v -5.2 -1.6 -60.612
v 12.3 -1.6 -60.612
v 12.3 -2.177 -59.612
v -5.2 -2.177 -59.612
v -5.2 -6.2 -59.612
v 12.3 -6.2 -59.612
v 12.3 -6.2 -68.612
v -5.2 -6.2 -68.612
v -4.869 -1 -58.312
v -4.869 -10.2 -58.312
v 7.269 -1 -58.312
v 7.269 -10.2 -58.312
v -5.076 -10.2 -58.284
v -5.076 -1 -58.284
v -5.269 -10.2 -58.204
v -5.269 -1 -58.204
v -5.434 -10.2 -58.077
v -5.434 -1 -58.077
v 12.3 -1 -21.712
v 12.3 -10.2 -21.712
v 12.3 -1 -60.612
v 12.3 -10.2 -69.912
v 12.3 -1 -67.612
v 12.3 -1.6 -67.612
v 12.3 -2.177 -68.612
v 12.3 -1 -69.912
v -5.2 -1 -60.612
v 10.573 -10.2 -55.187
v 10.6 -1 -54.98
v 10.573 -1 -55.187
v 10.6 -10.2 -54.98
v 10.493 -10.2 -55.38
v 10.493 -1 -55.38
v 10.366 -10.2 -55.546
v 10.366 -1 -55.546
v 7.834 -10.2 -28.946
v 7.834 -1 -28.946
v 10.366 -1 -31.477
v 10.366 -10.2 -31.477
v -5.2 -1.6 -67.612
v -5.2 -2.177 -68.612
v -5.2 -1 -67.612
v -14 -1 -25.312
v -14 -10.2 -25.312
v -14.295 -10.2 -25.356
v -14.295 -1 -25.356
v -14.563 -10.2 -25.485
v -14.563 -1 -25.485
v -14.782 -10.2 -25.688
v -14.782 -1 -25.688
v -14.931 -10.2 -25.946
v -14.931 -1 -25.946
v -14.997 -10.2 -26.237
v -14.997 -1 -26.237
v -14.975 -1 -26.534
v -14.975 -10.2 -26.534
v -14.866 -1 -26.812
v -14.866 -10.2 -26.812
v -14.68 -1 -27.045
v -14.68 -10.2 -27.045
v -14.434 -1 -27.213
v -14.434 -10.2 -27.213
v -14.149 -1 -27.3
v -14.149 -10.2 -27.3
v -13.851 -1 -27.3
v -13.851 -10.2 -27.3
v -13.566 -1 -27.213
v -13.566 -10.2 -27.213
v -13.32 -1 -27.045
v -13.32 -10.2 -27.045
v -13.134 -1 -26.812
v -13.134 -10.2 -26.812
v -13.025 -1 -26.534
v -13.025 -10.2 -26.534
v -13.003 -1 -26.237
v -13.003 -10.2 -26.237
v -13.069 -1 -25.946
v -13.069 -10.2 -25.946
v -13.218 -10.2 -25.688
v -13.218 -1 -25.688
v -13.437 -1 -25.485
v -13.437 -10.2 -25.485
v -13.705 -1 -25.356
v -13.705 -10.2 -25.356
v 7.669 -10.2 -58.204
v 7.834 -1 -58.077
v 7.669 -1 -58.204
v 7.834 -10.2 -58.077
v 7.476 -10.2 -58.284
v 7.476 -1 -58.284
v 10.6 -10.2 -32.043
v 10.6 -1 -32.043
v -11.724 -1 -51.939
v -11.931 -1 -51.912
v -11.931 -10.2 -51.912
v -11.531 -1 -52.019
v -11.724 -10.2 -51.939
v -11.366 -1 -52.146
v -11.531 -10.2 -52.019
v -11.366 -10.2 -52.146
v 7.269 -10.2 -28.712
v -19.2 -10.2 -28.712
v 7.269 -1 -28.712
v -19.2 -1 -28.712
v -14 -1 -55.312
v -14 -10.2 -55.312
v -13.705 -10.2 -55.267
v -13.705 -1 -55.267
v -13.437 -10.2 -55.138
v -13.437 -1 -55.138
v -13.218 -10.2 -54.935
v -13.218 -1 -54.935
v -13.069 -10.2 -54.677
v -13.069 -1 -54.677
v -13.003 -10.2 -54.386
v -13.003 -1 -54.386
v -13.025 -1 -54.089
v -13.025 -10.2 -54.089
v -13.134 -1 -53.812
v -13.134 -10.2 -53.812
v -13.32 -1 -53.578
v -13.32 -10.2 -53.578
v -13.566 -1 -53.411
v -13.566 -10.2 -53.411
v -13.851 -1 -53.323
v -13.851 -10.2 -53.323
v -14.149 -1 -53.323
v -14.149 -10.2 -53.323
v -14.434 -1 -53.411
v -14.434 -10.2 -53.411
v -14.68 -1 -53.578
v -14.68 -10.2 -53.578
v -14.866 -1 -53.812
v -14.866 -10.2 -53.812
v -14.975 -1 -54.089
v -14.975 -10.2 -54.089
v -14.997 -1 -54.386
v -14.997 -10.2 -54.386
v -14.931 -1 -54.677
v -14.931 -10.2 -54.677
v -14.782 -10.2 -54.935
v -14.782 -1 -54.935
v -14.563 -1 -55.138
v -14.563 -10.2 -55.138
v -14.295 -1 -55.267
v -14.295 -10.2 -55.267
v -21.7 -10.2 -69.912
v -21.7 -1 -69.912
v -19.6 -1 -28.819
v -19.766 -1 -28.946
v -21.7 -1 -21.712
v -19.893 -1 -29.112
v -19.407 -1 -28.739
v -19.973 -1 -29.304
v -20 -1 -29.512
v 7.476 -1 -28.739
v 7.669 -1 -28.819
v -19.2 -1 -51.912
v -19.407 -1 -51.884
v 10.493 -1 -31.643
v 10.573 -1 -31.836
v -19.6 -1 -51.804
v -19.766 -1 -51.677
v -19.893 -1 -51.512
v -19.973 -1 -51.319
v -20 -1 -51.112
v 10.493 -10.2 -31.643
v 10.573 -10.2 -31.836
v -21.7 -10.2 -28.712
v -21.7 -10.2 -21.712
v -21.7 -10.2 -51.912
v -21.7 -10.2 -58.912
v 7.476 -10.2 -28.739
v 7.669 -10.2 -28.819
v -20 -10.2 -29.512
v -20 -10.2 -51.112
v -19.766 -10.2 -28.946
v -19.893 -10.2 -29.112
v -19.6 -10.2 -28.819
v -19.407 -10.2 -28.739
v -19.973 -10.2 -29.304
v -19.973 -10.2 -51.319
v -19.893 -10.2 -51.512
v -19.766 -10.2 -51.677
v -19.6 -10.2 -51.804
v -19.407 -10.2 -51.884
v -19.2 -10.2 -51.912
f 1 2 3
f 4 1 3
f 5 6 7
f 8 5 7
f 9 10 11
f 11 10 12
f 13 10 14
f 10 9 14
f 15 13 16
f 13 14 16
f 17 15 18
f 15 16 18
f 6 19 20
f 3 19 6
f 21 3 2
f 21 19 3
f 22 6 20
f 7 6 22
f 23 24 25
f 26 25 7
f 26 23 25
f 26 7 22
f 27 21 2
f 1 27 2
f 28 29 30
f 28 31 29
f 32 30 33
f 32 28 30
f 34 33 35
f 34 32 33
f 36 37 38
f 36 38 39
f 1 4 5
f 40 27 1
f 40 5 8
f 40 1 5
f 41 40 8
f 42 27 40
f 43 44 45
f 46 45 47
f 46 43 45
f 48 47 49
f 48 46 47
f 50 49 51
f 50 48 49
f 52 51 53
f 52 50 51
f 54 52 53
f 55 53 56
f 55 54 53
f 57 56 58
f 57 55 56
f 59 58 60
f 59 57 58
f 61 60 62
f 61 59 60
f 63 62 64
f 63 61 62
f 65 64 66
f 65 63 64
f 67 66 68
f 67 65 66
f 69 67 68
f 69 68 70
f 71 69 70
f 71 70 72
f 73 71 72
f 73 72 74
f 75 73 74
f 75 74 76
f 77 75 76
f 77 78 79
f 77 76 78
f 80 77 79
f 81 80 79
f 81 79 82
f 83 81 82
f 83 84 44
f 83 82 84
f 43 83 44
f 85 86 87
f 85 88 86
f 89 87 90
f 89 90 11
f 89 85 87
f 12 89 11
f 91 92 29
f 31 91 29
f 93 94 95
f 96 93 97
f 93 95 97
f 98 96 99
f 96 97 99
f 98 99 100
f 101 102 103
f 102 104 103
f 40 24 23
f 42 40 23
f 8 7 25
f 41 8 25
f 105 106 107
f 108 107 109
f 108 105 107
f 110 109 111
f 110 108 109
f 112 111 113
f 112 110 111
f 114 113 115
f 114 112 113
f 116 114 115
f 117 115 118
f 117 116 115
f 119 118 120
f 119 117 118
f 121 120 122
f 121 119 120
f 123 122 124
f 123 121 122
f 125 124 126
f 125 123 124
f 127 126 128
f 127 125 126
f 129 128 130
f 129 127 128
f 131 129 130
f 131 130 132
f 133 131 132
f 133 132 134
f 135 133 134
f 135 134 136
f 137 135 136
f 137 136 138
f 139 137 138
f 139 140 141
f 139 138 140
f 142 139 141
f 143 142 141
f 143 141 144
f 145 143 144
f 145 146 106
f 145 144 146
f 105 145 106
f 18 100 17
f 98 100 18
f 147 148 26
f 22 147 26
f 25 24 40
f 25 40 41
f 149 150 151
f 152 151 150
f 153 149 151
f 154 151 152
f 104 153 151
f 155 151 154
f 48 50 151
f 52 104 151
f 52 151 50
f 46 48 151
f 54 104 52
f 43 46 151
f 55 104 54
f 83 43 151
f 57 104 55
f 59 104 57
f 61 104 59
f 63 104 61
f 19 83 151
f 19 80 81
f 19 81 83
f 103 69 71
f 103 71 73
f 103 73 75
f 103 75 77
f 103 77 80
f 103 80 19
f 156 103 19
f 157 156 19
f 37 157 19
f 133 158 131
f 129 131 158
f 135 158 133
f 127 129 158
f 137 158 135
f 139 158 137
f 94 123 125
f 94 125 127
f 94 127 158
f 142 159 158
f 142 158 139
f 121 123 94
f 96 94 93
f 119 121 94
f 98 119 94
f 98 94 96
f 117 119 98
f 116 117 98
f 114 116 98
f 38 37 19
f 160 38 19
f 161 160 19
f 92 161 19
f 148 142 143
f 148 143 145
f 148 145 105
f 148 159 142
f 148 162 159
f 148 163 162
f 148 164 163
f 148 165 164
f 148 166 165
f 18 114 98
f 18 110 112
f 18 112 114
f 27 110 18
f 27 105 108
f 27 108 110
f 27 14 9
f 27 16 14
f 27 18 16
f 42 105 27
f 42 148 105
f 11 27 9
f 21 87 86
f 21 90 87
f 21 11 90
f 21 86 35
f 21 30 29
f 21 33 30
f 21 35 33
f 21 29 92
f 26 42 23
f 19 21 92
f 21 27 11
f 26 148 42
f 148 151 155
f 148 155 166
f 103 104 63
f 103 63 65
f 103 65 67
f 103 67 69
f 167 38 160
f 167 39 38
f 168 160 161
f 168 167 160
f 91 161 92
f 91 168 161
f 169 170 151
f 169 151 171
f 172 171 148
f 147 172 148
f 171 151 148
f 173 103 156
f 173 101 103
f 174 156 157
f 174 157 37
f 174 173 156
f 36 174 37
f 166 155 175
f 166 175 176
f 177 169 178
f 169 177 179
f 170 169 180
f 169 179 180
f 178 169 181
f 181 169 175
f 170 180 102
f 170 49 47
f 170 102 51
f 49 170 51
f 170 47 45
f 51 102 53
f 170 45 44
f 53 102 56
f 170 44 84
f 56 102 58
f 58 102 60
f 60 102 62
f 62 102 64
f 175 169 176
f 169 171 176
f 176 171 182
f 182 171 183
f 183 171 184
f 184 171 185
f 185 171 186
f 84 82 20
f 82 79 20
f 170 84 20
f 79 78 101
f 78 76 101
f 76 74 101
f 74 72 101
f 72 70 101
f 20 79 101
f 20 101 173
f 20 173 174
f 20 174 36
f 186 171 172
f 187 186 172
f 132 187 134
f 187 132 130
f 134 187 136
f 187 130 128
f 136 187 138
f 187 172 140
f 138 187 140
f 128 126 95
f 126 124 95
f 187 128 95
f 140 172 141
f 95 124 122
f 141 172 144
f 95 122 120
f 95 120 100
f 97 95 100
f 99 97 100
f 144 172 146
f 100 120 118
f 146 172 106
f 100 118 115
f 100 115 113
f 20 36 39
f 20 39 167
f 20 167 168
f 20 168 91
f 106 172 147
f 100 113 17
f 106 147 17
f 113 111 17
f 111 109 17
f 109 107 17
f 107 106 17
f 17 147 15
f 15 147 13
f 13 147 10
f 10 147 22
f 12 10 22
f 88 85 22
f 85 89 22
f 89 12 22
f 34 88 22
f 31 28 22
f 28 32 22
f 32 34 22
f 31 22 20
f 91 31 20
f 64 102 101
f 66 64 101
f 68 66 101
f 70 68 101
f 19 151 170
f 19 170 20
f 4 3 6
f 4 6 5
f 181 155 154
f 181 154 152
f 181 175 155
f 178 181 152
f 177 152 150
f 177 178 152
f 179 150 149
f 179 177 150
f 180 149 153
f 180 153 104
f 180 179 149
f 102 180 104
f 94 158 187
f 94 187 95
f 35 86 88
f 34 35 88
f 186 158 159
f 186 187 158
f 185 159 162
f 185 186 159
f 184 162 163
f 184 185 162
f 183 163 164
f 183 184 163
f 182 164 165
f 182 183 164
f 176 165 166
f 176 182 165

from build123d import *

# Parameters (mm, degrees)
BOSS_EXTRUDE1_START      = -1
SKETCH1_W                = 1.7
SKETCH1_H                = 89.2
BOSS_EXTRUDE1_DEPTH      = 9.2
SKETCH4_W                = 33.7
SKETCH4_H                = 11.6
BOSS_EXTRUDE3_DEPTH      = 9.2
SERVO_HOLDER_DEPTH       = 1
SERVO_HOLDER_DEPTH_BACK  = 9.2
SKETCH3_W                = 14
SKETCH3_H                = 7
SKETCH3_R                = 1
SKETCH37_W               = 20
SKETCH37_H               = 7
BOSS_EXTRUDE19_DEPTH     = 10.2
CUT_EXTRUDE10_DEPTH      = 93.482268571
CUT_EXTRUDE10_DEPTH_BACK = 93.482268571
SKETCH29_W               = 34.409909993
SKETCH29_H               = 5.977389624
BOSS_EXTRUDE13_START     = 2
SKETCH30_W               = 34
SKETCH30_H               = 38
SKETCH30_R               = 1.6
BOSS_EXTRUDE13_DEPTH     = 6.5
SKETCH41_W               = 17.288461538
SKETCH41_H               = 9.2
CUT_EXTRUDE14_DEPTH      = 15
BOSS_EXTRUDE14_START     = -38
SKETCH32_R               = 1.45
SKETCH32_R_2             = 5
BOSS_EXTRUDE14_DEPTH     = 8.8
BOSS_EXTRUDE16_DEPTH     = 3
BOSS_EXTRUDE17_DEPTH     = 3
BOSS_EXTRUDE18_START     = -9.2
BOSS_EXTRUDE18_DEPTH     = 9.2
SKETCH39_W               = 1.7
SKETCH39_H               = 41.2
BOSS_EXTRUDE20_DEPTH     = 9.2
CUT_EXTRUDE13_DEPTH      = 17.5
CHAMFER2_SIZE            = 0.6
CHAMFER2_SIZE_2          = 1.039230485
CHAMFER3_SIZE            = 3
FILLET10_R               = 6
CUT_EXTRUDE15_DEPTH      = 10
CHAMFER4_SIZE            = 2.5
CUT_EXTRUDE16_DEPTH      = 10
FILLET11_R               = 0.8
SKETCH44_W               = 59.192885725
SKETCH44_H               = 45.417181718
CUT_EXTRUDE17_DEPTH      = 87.948983376


with BuildPart() as part:
    # Sketch1 → Boss-Extrude1 (new body)
    with BuildSketch(Plane(origin=(0, 0, 0), x_dir=(1, 0, 0), z_dir=(0, 1, 0)).offset(BOSS_EXTRUDE1_START)):
        with Locations((-20.85, 25.311538462)):
            Rectangle(SKETCH1_W, SKETCH1_H)
    extrude(amount=-BOSS_EXTRUDE1_DEPTH)

    # Sketch4 → Boss-Extrude3 (add)
    with BuildSketch(Plane.XZ.offset(10.2)):
        with Locations((-4.85, -64.111538462)):
            Rectangle(SKETCH4_W, SKETCH4_H)
    extrude(amount=-BOSS_EXTRUDE3_DEPTH)

    # Sketch3 → Servo Holder (add, two sides: drawn at the far end of the back side and taken through both)
    # profile 1 of 2: a face of its own
    with BuildSketch(Plane.XZ.offset(10.2).offset(-SERVO_HOLDER_DEPTH_BACK)):
        with Locations((-14.7, -55.411538462)):
            Rectangle(SKETCH3_W, SKETCH3_H)
        with Locations(Location((-14, -54.311538462, 0), (0, 0, 270))):
            Circle(SKETCH3_R, mode=Mode.SUBTRACT)
    # profile 2 of 2: a face of its own
    with BuildSketch(Plane.XZ.offset(10.2).offset(-SERVO_HOLDER_DEPTH_BACK)):
        with Locations((-14.7, -25.211538462)):
            Rectangle(SKETCH3_W, SKETCH3_H)
        with Locations(Location((-14, -26.311538462, 0), (0, 0, 90))):
            Circle(SKETCH3_R, mode=Mode.SUBTRACT)
    extrude(amount=SERVO_HOLDER_DEPTH + SERVO_HOLDER_DEPTH_BACK)

    # Sketch37 → Boss-Extrude19 (add)
    with BuildSketch(Plane(origin=(0, -1, 0), x_dir=(1, 0, 0), z_dir=(0, 1, 0))):
        with Locations((2.3, 25.211538462)):
            Rectangle(SKETCH37_W, SKETCH37_H)
    extrude(amount=-BOSS_EXTRUDE19_DEPTH)

    # Sketch29 → Cut-Extrude10 (cut, two sides: drawn at the far end of the back side and taken through both)
    with BuildSketch(Plane(origin=(0, 0, -69.911538462), x_dir=(-1, 0, 0), z_dir=(0, 0, -1)).offset(-CUT_EXTRUDE10_DEPTH_BACK)):
        with Locations((4.495045004, -13.188694812)):
            Rectangle(SKETCH29_W, SKETCH29_H)
    extrude(amount=CUT_EXTRUDE10_DEPTH + CUT_EXTRUDE10_DEPTH_BACK, mode=Mode.SUBTRACT)


with BuildPart() as body_2:
    # Sketch30 → Boss-Extrude13 (new body)
    with BuildSketch(Plane.XY.offset(BOSS_EXTRUDE13_START)):
        with Locations((-4.7, -20)):
            Rectangle(SKETCH30_W, SKETCH30_H)
        with Locations(Location((5.3, -34, 0), (0, 0, 180))):
            Circle(SKETCH30_R, mode=Mode.SUBTRACT)
        with Locations(Location((5.3, -19, 0), (0, 0, 180))):
            Circle(SKETCH30_R, mode=Mode.SUBTRACT)
        with Locations(Location((-14.7, -34, 0), (0, 0, 180))):
            Circle(SKETCH30_R, mode=Mode.SUBTRACT)
        with Locations(Location((-14.7, -19, 0), (0, 0, 180))):
            Circle(SKETCH30_R, mode=Mode.SUBTRACT)
    extrude(amount=BOSS_EXTRUDE13_DEPTH)


with BuildPart() as cut_extrude14_tool:
    # Sketch41 → Cut-Extrude14 (new body)
    with BuildSketch(Plane(origin=(-20, 0, 0), x_dir=(0, 0, -1), z_dir=(1, 0, 0))):
        with Locations((-10.644230769, -5.6)):
            Rectangle(SKETCH41_W, SKETCH41_H)
    extrude(amount=-CUT_EXTRUDE14_DEPTH)


with BuildPart() as part_1:
    add(part.part)

    # Cut-Extrude14: cut by cut_extrude14_tool
    add(cut_extrude14_tool.part, mode=Mode.SUBTRACT)



with BuildPart() as body_2_1:
    add(body_2.part)

    # Cut-Extrude14: cut by cut_extrude14_tool
    add(cut_extrude14_tool.part, mode=Mode.SUBTRACT)

    # Sketch32 → Boss-Extrude14 (add)
    with BuildSketch(Plane.XZ.offset(39).offset(BOSS_EXTRUDE14_START)):
        with BuildLine():
            ThreePointArc((11.872921748, 2), (25.925390485, -3.535644523), (35.05, 8.5))
            ThreePointArc((35.05, 8.5), (22.55, 21), (10.05, 8.5))
            Line((10.05, 8.5), (12.3, 8.5))
            Line((12.3, 8.5), (12.3, 2))
            Line((12.3, 2), (11.872921748, 2))
        make_face()
        with Locations(Location((15.25884337, 2.409923235, 0), (0, 0, 180))):
            Circle(SKETCH32_R, mode=Mode.SUBTRACT)
        with Locations(Location((28.640076765, 1.20884337, 0), (0, 0, 180))):
            Circle(SKETCH32_R, mode=Mode.SUBTRACT)
        with Locations(Location((16.459923235, 15.79115663, 0), (0, 0, 180))):
            Circle(SKETCH32_R, mode=Mode.SUBTRACT)
        with Locations(Location((22.55, 8.5, 0), (0, 0, 180))):
            Circle(SKETCH32_R_2, mode=Mode.SUBTRACT)
        with Locations(Location((29.84115663, 14.590076765, 0), (0, 0, 180))):
            Circle(SKETCH32_R, mode=Mode.SUBTRACT)
    extrude(amount=BOSS_EXTRUDE14_DEPTH)


with BuildPart() as part_2:
    add(part_1.part)

    add(body_2_1.part)  # Boss-Extrude16 merges body 2
    # Sketch34 → Boss-Extrude16 (add)
    with BuildSketch(Plane.ZY.offset(21.7)):
        Polygon((-21.711538462, -1), (-21.711538462, -9.8), (2, -39), (8.5, -39), (8.5, -1), align=None)
    extrude(amount=-BOSS_EXTRUDE16_DEPTH)

    # Sketch35 → Boss-Extrude17 (add)
    with BuildSketch(Plane(origin=(12.3, 0, 0), x_dir=(0, 0, -1), z_dir=(1, 0, 0))):
        Polygon((-2, -1), (21.711538462, -1), (21.711538462, -9.8), (-2, -39), (-8.5, -39), (-8.5, -9.8), (-8.5, -1), align=None)
    extrude(amount=-BOSS_EXTRUDE17_DEPTH)

    # Sketch36 → Boss-Extrude18 (add)
    with BuildSketch(Plane.XZ.offset(10.2).offset(BOSS_EXTRUDE18_START)):
        Polygon((12.3, -10.579162849), (16.63422252, -2.511520186), (12.3, 1.345455989), align=None)
    extrude(amount=BOSS_EXTRUDE18_DEPTH)

    # Sketch39 → Boss-Extrude20 (add)
    with BuildSketch(Plane(origin=(0, -1, 0), x_dir=(1, 0, 0), z_dir=(0, 1, 0))):
        with Locations((11.45, 49.311538462)):
            Rectangle(SKETCH39_W, SKETCH39_H)
    extrude(amount=-BOSS_EXTRUDE20_DEPTH)

    # Sketch40 → Cut-Extrude13 (cut)
    with BuildSketch(Plane(origin=(12.3, 0, 0), x_dir=(0, 0, -1), z_dir=(1, 0, 0))):
        Polygon((64.111538462, -1), (60.611538462, -1), (60.611538462, -2.2), (59.611538462, -2.2), (59.611538462, -6.2), (64.111538462, -6.2), align=None)
        Polygon((67.611538462, -1), (64.111538462, -1), (64.111538462, -6.2), (68.611538462, -6.2), (68.611538462, -2.2), (67.611538462, -2.2), align=None)
    extrude(amount=-CUT_EXTRUDE13_DEPTH, mode=Mode.SUBTRACT)

    # Chamfer2
    # the kernel refuses this chamfer: 1.039230485, 0.6 mm, written as the material it takes off along each edge
    with BuildSketch(Plane(origin=(14.988578382, -2.2, -67.611538462), x_dir=(0, 0.9983227437537925, 0.05789386240267319), z_dir=(-1, 0, 0))) as chamfer2_piece_1_section:
        Polygon((CHAMFER2_SIZE * 0.998322743754, CHAMFER2_SIZE * 0.0578938624027), (-CHAMFER2_SIZE_2 * 0.0578938623771, CHAMFER2_SIZE_2 * 0.998322743313), (0, 0), align=None)
    chamfer2_piece_1 = extrude(amount=20.188578382, mode=Mode.PRIVATE)
    chamfer2_piece_1 = split(chamfer2_piece_1, bisect_by=Plane(origin=(4.894289191, -2.005782009, -68.611538462), z_dir=(0, 0, 1)), keep=Keep.TOP, mode=Mode.PRIVATE)
    add(chamfer2_piece_1, mode=Mode.SUBTRACT)
    with BuildSketch(Plane(origin=(14.988578382, -2.2, -60.611538462), x_dir=(0, 0.9983227437537925, -0.05789386240267317), z_dir=(-1, 0, 0))) as chamfer2_piece_2_section:
        Polygon((CHAMFER2_SIZE * 0.998322743754, -CHAMFER2_SIZE * 0.0578938624027), (-CHAMFER2_SIZE_2 * 0.0578938623771, -CHAMFER2_SIZE_2 * 0.998322743313), (0, 0), align=None)
    chamfer2_piece_2 = extrude(amount=20.188578382, mode=Mode.PRIVATE)
    chamfer2_piece_2 = split(chamfer2_piece_2, bisect_by=Plane(origin=(4.894289191, -2.005782009, -59.611538462), z_dir=(0, 0, -1)), keep=Keep.TOP, mode=Mode.PRIVATE)
    add(chamfer2_piece_2, mode=Mode.SUBTRACT)

    # Chamfer3
    chamfer3_edges = [part_2.edges().sort_by_distance(p)[0] for p in [
        (10.6, -5.6, -58.311538462),
        (10.6, -5.6, -28.711538462),
    ]]
    chamfer(chamfer3_edges, length=CHAMFER3_SIZE)

    # Fillet10
    fillet10_edges = [part_2.edges().sort_by_distance(p)[0] for p in [
        (16.63422252, -5.4, -2.511520186),
        (12.3, -5.6, -10.579162849),
    ]]
    fillet(fillet10_edges, radius=FILLET10_R)

    # Sketch42 → Cut-Extrude15 (cut)
    with BuildSketch(Plane.XY.offset(8.5)):
        with BuildLine():
            Line((-1.1, -1), (-1.1, -10.6))
            ThreePointArc((-1.1, -10.6), (-4.7, -14.2), (-8.3, -10.6))
            Line((-8.3, -10.6), (-8.3, -1))
            Line((-8.3, -1), (-1.1, -1))
        make_face()
    extrude(amount=-CUT_EXTRUDE15_DEPTH, mode=Mode.SUBTRACT)

    # Chamfer4
    chamfer4_edges = [part_2.edges().sort_by_distance(p)[0] for p in [
        (-7.7, -5.6, -58.311538462),
    ]]
    chamfer(chamfer4_edges, length=CHAMFER4_SIZE)

    # Sketch43 → Cut-Extrude16 (cut)
    with BuildSketch(Plane(origin=(0, -1, 0), x_dir=(1, 0, 0), z_dir=(0, 1, 0))):
        Polygon((-5.2, 58.311538462), (-11.6, 51.911538462), (-5.2, 51.911538462), align=None)
    extrude(amount=-CUT_EXTRUDE16_DEPTH, mode=Mode.SUBTRACT)

    # Fillet11
    fillet11_edges = [part_2.edges().sort_by_distance(p)[0] for p in [
        (-20, -5.6, -28.711538462),
        (-20, -5.6, -51.911538462),
        (10.6, -5.6, -55.311538462),
        (10.6, -5.6, -31.711538462),
        (7.6, -5.6, -28.711538462),
        (7.6, -5.6, -58.311538462),
        (-5.2, -5.6, -58.311538462),
        (-11.6, -5.6, -51.911538462),
    ]]
    fillet(fillet11_edges, radius=FILLET11_R)

    # Sketch44 → Cut-Extrude17 (cut, through all)
    with BuildSketch(Plane(origin=(0, -1, 0), x_dir=(1, 0, 0), z_dir=(0, 1, 0))):
        with Locations((7.896442862, -0.997052397)):
            Rectangle(SKETCH44_W, SKETCH44_H)
    extrude(amount=-CUT_EXTRUDE17_DEPTH, mode=Mode.SUBTRACT)


solid = part_2.part
